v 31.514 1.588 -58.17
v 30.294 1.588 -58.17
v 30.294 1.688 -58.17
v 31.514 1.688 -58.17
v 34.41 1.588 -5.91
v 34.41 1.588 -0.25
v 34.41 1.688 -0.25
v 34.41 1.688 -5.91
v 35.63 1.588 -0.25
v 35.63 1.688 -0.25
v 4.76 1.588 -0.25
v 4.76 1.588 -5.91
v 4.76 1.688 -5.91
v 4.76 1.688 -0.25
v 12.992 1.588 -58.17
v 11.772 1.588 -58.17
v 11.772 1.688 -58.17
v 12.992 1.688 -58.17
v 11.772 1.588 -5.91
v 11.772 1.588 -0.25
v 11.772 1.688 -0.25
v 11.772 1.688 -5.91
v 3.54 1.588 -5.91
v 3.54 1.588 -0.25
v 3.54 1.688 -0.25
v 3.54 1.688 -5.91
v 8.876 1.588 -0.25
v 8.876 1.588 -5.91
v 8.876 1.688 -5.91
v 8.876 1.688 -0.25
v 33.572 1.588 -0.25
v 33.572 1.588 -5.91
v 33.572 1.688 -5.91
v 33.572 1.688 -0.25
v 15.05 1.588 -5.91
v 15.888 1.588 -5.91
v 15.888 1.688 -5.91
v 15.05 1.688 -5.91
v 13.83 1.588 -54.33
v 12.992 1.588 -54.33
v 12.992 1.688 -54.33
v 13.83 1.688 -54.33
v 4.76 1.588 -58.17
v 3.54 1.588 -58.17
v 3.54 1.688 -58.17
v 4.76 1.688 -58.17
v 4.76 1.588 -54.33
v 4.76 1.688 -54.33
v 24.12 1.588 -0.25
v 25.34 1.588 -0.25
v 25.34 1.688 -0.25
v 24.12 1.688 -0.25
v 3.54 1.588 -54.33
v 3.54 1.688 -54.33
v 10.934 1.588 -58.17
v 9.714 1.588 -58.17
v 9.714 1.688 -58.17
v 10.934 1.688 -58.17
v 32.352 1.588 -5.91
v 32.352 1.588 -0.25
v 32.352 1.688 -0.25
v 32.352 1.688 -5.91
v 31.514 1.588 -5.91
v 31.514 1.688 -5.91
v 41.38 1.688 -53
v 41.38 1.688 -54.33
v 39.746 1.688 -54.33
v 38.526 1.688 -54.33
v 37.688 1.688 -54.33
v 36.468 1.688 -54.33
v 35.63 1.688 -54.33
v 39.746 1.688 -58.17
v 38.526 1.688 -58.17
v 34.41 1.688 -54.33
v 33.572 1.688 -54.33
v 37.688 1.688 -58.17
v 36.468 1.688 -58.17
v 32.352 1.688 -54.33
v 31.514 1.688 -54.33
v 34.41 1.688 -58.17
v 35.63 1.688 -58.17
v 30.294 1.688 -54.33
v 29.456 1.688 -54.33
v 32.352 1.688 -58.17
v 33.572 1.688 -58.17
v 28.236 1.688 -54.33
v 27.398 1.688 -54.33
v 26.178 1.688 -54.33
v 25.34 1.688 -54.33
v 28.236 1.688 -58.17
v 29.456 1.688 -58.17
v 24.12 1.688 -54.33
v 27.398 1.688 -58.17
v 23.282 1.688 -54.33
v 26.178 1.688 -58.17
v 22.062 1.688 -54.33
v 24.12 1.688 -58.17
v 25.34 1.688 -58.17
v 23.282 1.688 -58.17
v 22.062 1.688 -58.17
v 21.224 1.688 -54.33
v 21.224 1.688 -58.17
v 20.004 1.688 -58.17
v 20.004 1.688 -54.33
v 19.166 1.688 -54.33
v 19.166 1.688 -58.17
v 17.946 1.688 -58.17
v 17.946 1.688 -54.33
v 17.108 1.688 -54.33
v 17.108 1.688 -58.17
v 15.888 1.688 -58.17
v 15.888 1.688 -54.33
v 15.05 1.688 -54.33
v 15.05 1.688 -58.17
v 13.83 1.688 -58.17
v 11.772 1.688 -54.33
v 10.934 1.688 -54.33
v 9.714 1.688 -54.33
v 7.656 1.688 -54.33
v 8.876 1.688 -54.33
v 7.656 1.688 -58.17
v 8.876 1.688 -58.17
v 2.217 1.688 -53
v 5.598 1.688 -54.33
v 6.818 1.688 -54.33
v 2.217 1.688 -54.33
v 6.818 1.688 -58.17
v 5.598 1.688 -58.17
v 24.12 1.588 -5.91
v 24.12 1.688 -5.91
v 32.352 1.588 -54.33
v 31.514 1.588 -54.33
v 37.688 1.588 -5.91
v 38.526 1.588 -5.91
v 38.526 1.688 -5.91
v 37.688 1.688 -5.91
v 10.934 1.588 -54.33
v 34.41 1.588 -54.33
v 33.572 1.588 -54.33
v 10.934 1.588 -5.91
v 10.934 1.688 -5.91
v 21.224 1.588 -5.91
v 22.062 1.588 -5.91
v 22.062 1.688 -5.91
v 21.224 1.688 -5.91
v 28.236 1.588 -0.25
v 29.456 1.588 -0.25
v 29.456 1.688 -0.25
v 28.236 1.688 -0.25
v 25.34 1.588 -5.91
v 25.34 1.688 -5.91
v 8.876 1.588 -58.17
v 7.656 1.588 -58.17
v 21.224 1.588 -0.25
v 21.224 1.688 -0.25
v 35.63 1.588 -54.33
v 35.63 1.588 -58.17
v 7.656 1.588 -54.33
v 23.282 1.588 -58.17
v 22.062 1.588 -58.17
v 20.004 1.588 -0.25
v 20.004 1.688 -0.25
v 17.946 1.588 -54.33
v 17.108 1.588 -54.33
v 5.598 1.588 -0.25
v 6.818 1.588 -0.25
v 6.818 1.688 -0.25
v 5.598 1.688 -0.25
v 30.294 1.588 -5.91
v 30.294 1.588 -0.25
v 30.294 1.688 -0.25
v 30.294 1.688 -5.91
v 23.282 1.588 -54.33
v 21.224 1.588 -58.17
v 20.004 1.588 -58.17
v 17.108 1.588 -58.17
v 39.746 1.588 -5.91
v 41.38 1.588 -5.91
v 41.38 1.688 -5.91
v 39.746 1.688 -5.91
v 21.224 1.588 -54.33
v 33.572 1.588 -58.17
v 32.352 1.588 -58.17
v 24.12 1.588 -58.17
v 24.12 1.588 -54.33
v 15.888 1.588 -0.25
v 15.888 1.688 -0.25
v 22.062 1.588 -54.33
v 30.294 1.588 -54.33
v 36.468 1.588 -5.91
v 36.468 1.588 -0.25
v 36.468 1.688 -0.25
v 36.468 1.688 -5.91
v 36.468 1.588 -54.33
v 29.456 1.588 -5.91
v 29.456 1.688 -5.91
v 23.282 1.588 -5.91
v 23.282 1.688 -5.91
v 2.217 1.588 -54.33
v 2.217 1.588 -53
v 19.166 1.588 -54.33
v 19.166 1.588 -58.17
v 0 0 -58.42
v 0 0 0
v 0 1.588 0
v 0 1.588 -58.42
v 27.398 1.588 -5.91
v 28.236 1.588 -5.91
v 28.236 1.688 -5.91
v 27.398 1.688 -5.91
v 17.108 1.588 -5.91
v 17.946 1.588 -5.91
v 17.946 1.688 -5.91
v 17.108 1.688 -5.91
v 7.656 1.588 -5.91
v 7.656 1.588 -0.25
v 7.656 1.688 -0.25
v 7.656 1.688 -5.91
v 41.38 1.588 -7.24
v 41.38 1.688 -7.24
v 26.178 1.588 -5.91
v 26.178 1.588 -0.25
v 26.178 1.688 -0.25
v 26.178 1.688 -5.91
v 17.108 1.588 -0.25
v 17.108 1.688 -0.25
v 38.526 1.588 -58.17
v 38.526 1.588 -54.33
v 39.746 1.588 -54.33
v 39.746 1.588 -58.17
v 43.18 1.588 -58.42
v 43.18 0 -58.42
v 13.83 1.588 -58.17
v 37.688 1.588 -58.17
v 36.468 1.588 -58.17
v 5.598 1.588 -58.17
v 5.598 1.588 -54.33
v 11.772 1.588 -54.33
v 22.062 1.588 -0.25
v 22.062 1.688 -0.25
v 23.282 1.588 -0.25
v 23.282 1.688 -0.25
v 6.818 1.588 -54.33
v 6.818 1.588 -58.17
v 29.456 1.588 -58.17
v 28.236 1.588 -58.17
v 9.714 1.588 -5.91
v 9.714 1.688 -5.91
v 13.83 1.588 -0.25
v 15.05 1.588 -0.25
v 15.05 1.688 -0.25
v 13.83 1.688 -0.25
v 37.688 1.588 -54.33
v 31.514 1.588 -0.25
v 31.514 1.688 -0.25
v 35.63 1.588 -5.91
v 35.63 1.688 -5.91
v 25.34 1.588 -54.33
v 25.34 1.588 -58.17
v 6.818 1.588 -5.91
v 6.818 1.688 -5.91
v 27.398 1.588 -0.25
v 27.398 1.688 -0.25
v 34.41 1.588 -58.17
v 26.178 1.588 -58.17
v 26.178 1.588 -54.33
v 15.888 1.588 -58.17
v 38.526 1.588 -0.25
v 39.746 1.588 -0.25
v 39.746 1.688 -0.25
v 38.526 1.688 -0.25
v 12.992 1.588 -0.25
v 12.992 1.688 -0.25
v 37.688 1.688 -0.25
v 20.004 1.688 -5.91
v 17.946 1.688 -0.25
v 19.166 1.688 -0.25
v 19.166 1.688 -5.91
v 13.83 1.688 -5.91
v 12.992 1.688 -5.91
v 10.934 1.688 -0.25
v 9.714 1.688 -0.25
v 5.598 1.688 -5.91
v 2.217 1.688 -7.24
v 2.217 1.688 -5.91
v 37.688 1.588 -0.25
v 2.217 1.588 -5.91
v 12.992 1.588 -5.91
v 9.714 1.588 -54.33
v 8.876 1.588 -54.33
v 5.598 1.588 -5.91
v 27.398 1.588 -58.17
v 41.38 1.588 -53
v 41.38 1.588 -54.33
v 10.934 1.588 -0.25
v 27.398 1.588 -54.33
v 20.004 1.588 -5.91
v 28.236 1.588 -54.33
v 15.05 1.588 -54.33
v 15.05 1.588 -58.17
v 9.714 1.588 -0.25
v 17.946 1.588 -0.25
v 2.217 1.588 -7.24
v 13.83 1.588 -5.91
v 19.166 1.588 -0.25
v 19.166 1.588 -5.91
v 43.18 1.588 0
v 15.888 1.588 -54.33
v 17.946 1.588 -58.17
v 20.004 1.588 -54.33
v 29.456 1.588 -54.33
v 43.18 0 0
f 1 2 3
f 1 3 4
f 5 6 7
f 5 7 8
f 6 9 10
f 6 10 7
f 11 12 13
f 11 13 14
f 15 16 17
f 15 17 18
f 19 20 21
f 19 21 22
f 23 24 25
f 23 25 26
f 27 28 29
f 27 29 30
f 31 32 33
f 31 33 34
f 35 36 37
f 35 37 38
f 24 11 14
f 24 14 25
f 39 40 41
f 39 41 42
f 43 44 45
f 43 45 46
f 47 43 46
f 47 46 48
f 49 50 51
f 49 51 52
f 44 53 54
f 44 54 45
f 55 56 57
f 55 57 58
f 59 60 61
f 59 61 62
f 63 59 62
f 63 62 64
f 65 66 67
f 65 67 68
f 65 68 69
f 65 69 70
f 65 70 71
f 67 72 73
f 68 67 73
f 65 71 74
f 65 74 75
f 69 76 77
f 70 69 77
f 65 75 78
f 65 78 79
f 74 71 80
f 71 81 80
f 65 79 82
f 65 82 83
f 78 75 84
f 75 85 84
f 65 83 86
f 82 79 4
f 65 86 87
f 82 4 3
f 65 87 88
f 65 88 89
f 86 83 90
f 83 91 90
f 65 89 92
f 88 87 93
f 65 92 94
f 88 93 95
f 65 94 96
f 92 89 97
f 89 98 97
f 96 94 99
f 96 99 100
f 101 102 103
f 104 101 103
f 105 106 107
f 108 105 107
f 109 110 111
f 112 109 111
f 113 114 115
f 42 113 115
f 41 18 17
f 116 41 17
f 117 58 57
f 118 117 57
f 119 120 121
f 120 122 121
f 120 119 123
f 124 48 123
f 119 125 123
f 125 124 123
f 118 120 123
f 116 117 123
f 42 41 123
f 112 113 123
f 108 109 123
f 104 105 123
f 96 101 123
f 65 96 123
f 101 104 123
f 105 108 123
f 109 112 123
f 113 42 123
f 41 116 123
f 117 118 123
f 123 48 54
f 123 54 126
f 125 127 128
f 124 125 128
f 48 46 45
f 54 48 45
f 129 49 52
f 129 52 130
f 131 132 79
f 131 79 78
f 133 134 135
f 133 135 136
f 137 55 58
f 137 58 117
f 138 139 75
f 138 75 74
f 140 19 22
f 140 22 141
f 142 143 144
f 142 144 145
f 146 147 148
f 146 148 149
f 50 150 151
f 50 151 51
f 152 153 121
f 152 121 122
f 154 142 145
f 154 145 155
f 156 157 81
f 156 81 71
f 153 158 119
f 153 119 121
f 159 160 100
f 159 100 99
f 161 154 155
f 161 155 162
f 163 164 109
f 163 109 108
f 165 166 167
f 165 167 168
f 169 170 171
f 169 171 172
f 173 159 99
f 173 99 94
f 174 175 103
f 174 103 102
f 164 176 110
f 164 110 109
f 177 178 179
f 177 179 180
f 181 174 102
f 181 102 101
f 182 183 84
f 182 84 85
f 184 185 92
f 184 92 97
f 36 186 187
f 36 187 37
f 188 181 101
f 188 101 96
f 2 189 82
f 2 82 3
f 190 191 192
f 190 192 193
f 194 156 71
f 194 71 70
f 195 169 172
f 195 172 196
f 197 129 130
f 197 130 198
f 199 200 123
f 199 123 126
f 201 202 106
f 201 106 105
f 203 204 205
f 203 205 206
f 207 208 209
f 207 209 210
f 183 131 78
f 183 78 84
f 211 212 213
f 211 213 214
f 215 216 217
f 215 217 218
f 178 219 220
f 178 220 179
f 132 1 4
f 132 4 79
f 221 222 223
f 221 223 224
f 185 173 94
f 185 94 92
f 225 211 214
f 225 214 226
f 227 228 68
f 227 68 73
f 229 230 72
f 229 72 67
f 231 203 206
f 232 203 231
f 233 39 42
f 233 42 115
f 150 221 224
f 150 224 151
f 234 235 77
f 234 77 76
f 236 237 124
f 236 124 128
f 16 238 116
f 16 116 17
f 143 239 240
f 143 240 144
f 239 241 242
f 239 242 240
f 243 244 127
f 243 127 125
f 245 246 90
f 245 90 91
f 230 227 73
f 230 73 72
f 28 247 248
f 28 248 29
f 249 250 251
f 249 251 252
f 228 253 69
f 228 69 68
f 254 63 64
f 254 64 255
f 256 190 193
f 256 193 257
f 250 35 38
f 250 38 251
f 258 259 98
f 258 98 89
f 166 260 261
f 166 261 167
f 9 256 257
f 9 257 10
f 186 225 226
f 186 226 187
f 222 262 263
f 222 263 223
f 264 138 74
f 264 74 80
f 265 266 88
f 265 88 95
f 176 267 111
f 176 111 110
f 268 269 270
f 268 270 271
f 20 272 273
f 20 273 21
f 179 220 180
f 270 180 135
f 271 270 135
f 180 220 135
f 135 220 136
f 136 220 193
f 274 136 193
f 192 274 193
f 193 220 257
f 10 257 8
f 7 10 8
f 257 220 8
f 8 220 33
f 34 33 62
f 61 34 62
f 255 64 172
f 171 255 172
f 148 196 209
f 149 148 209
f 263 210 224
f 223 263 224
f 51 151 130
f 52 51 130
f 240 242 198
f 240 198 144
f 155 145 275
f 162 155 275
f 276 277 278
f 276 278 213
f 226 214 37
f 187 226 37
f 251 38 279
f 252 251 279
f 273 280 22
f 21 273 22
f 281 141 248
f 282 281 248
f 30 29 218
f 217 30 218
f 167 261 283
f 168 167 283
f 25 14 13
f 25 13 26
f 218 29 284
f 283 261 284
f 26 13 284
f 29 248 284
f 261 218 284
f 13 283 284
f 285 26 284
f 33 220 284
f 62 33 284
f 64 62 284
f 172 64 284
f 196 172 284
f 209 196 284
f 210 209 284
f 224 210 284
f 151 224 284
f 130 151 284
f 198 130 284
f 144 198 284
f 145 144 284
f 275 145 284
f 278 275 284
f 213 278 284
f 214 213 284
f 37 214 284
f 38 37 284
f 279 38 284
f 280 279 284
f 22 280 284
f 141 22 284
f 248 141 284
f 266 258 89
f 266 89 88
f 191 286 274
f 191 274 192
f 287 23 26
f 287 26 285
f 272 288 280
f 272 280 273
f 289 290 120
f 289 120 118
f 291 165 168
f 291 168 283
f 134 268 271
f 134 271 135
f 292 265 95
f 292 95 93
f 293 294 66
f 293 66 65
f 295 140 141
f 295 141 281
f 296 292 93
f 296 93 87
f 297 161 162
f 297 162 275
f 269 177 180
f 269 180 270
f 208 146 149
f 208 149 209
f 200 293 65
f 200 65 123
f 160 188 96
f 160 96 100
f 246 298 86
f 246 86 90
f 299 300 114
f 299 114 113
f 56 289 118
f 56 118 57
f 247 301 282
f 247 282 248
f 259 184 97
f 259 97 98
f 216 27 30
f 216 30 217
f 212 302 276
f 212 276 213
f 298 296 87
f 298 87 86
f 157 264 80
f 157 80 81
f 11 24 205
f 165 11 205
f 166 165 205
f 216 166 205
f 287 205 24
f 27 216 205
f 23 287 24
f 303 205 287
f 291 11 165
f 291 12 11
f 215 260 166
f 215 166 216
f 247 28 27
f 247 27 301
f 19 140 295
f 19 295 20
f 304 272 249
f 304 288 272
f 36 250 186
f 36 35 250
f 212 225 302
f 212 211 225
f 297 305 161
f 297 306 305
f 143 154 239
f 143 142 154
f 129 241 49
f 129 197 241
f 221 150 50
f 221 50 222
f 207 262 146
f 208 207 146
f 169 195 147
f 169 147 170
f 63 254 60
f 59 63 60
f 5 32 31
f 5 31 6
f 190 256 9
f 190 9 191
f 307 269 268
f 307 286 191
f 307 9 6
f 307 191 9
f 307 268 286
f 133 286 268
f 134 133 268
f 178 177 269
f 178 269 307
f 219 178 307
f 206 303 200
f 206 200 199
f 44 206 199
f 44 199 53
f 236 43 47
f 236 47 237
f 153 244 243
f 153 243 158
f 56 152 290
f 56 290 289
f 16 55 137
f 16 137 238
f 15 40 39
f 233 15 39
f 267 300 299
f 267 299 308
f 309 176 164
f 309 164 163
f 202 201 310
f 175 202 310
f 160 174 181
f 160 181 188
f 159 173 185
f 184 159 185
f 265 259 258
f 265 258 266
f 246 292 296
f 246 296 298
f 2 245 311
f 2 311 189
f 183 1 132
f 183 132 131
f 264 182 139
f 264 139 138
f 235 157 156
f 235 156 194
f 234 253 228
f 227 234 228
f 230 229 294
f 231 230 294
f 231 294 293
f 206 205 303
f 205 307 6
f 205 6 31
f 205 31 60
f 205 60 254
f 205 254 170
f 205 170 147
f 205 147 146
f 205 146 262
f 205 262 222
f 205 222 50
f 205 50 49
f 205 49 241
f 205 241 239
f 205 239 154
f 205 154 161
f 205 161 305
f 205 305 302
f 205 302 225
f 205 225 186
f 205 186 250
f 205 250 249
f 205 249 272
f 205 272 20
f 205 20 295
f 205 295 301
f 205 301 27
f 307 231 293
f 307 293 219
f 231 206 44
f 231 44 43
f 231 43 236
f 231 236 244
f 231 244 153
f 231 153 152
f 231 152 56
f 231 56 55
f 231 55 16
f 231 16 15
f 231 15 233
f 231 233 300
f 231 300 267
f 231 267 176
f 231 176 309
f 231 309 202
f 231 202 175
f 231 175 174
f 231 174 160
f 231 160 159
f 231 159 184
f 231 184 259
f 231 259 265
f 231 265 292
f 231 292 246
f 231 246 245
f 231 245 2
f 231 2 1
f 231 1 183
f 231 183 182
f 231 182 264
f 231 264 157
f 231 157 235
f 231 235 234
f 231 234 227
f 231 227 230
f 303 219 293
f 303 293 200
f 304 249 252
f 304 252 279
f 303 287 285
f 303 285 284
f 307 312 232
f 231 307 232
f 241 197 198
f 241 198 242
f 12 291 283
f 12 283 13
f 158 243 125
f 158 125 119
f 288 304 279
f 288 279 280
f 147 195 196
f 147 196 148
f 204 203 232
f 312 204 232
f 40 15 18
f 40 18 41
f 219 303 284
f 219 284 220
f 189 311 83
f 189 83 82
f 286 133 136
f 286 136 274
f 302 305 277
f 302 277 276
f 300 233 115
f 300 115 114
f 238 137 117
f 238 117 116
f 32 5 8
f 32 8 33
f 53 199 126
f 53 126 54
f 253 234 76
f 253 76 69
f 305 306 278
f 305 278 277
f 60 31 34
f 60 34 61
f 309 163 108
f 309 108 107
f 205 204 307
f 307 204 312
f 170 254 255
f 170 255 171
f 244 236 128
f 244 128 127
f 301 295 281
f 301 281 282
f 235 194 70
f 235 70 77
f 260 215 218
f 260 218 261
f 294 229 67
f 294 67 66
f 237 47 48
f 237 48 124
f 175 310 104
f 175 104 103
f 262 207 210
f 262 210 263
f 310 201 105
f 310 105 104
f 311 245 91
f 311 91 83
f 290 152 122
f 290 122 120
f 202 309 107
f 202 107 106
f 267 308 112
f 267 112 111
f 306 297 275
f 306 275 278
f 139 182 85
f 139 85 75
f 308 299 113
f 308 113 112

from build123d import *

# Parameters (mm, degrees)
SKETCH1_W           = 43.18
SKETCH1_H           = 58.42
BOSS_EXTRUDE1_DEPTH = 1.5875
BOSS_EXTRUDE2_DEPTH = 0.1


with BuildPart() as part:
    # Sketch1 → Boss-Extrude1 (new body)
    with BuildSketch(Plane(origin=(0, 0, 0), x_dir=(1, 0, 0), z_dir=(0, 1, 0))):
        with Locations((21.59, 29.21)):
            Rectangle(SKETCH1_W, SKETCH1_H)
    extrude(amount=BOSS_EXTRUDE1_DEPTH)

    # Sketch2 → Boss-Extrude2 (add)
    with BuildSketch(Plane(origin=(0, 1.5875, 0), x_dir=(1, 0, 0), z_dir=(0, 1, 0))):
        Polygon((2.217, 7.24), (41.38, 7.24), (41.38, 5.91), (39.746, 5.91), (39.746, 0.25), (38.526, 0.25), (38.526, 5.91), (37.688, 5.91), (37.688, 0.25), (36.468, 0.25), (36.468, 5.91), (35.63, 5.91), (35.63, 0.25), (34.41, 0.25), (34.41, 5.91), (33.572, 5.91), (33.572, 0.25), (32.352, 0.25), (32.352, 5.91), (31.514, 5.91), (31.514, 0.25), (30.294, 0.25), (30.294, 5.91), (29.456, 5.91), (29.456, 0.25), (28.236, 0.25), (28.236, 5.91), (27.398, 5.91), (27.398, 0.25), (26.178, 0.25), (26.178, 5.91), (25.34, 5.91), (25.34, 0.25), (24.12, 0.25), (24.12, 5.91), (23.282, 5.91), (23.282, 0.25), (22.062, 0.25), (22.062, 5.91), (21.224, 5.91), (21.224, 0.25), (20.004, 0.25), (20.004, 5.91), (19.166, 5.91), (19.166, 0.25), (17.946, 0.25), (17.946, 5.91), (17.108, 5.91), (17.108, 0.25), (15.888, 0.25), (15.888, 5.91), (15.05, 5.91), (15.05, 0.25), (13.83, 0.25), (13.83, 5.91), (12.992, 5.91), (12.992, 0.25), (11.772, 0.25), (11.772, 5.91), (10.934, 5.91), (10.934, 0.25), (9.714, 0.25), (9.714, 5.91), (8.876, 5.91), (8.876, 0.25), (7.656, 0.25), (7.656, 5.91), (6.818, 5.91), (6.818, 0.25), (5.598, 0.25), (5.598, 5.91), (4.76, 5.91), (4.76, 0.25), (3.54, 0.25), (3.54, 5.91), (2.217, 5.91), align=None)
        Polygon((41.38, 53), (2.217, 53), (2.217, 54.33), (3.54, 54.33), (3.54, 58.17), (4.76, 58.17), (4.76, 54.33), (5.598, 54.33), (5.598, 58.17), (6.818, 58.17), (6.818, 54.33), (7.656, 54.33), (7.656, 58.17), (8.876, 58.17), (8.876, 54.33), (9.714, 54.33), (9.714, 58.17), (10.934, 58.17), (10.934, 54.33), (11.772, 54.33), (11.772, 58.17), (12.992, 58.17), (12.992, 54.33), (13.83, 54.33), (13.83, 58.17), (15.05, 58.17), (15.05, 54.33), (15.888, 54.33), (15.888, 58.17), (17.108, 58.17), (17.108, 54.33), (17.946, 54.33), (17.946, 58.17), (19.166, 58.17), (19.166, 54.33), (20.004, 54.33), (20.004, 58.17), (21.224, 58.17), (21.224, 54.33), (22.062, 54.33), (22.062, 58.17), (23.282, 58.17), (23.282, 54.33), (24.12, 54.33), (24.12, 58.17), (25.34, 58.17), (25.34, 54.33), (26.178, 54.33), (26.178, 58.17), (27.398, 58.17), (27.398, 54.33), (28.236, 54.33), (28.236, 58.17), (29.456, 58.17), (29.456, 54.33), (30.294, 54.33), (30.294, 58.17), (31.514, 58.17), (31.514, 54.33), (32.352, 54.33), (32.352, 58.17), (33.572, 58.17), (33.572, 54.33), (34.41, 54.33), (34.41, 58.17), (35.63, 58.17), (35.63, 54.33), (36.468, 54.33), (36.468, 58.17), (37.688, 58.17), (37.688, 54.33), (38.526, 54.33), (38.526, 58.17), (39.746, 58.17), (39.746, 54.33), (41.38, 54.33), align=None)
    extrude(amount=BOSS_EXTRUDE2_DEPTH)


solid = part.part
